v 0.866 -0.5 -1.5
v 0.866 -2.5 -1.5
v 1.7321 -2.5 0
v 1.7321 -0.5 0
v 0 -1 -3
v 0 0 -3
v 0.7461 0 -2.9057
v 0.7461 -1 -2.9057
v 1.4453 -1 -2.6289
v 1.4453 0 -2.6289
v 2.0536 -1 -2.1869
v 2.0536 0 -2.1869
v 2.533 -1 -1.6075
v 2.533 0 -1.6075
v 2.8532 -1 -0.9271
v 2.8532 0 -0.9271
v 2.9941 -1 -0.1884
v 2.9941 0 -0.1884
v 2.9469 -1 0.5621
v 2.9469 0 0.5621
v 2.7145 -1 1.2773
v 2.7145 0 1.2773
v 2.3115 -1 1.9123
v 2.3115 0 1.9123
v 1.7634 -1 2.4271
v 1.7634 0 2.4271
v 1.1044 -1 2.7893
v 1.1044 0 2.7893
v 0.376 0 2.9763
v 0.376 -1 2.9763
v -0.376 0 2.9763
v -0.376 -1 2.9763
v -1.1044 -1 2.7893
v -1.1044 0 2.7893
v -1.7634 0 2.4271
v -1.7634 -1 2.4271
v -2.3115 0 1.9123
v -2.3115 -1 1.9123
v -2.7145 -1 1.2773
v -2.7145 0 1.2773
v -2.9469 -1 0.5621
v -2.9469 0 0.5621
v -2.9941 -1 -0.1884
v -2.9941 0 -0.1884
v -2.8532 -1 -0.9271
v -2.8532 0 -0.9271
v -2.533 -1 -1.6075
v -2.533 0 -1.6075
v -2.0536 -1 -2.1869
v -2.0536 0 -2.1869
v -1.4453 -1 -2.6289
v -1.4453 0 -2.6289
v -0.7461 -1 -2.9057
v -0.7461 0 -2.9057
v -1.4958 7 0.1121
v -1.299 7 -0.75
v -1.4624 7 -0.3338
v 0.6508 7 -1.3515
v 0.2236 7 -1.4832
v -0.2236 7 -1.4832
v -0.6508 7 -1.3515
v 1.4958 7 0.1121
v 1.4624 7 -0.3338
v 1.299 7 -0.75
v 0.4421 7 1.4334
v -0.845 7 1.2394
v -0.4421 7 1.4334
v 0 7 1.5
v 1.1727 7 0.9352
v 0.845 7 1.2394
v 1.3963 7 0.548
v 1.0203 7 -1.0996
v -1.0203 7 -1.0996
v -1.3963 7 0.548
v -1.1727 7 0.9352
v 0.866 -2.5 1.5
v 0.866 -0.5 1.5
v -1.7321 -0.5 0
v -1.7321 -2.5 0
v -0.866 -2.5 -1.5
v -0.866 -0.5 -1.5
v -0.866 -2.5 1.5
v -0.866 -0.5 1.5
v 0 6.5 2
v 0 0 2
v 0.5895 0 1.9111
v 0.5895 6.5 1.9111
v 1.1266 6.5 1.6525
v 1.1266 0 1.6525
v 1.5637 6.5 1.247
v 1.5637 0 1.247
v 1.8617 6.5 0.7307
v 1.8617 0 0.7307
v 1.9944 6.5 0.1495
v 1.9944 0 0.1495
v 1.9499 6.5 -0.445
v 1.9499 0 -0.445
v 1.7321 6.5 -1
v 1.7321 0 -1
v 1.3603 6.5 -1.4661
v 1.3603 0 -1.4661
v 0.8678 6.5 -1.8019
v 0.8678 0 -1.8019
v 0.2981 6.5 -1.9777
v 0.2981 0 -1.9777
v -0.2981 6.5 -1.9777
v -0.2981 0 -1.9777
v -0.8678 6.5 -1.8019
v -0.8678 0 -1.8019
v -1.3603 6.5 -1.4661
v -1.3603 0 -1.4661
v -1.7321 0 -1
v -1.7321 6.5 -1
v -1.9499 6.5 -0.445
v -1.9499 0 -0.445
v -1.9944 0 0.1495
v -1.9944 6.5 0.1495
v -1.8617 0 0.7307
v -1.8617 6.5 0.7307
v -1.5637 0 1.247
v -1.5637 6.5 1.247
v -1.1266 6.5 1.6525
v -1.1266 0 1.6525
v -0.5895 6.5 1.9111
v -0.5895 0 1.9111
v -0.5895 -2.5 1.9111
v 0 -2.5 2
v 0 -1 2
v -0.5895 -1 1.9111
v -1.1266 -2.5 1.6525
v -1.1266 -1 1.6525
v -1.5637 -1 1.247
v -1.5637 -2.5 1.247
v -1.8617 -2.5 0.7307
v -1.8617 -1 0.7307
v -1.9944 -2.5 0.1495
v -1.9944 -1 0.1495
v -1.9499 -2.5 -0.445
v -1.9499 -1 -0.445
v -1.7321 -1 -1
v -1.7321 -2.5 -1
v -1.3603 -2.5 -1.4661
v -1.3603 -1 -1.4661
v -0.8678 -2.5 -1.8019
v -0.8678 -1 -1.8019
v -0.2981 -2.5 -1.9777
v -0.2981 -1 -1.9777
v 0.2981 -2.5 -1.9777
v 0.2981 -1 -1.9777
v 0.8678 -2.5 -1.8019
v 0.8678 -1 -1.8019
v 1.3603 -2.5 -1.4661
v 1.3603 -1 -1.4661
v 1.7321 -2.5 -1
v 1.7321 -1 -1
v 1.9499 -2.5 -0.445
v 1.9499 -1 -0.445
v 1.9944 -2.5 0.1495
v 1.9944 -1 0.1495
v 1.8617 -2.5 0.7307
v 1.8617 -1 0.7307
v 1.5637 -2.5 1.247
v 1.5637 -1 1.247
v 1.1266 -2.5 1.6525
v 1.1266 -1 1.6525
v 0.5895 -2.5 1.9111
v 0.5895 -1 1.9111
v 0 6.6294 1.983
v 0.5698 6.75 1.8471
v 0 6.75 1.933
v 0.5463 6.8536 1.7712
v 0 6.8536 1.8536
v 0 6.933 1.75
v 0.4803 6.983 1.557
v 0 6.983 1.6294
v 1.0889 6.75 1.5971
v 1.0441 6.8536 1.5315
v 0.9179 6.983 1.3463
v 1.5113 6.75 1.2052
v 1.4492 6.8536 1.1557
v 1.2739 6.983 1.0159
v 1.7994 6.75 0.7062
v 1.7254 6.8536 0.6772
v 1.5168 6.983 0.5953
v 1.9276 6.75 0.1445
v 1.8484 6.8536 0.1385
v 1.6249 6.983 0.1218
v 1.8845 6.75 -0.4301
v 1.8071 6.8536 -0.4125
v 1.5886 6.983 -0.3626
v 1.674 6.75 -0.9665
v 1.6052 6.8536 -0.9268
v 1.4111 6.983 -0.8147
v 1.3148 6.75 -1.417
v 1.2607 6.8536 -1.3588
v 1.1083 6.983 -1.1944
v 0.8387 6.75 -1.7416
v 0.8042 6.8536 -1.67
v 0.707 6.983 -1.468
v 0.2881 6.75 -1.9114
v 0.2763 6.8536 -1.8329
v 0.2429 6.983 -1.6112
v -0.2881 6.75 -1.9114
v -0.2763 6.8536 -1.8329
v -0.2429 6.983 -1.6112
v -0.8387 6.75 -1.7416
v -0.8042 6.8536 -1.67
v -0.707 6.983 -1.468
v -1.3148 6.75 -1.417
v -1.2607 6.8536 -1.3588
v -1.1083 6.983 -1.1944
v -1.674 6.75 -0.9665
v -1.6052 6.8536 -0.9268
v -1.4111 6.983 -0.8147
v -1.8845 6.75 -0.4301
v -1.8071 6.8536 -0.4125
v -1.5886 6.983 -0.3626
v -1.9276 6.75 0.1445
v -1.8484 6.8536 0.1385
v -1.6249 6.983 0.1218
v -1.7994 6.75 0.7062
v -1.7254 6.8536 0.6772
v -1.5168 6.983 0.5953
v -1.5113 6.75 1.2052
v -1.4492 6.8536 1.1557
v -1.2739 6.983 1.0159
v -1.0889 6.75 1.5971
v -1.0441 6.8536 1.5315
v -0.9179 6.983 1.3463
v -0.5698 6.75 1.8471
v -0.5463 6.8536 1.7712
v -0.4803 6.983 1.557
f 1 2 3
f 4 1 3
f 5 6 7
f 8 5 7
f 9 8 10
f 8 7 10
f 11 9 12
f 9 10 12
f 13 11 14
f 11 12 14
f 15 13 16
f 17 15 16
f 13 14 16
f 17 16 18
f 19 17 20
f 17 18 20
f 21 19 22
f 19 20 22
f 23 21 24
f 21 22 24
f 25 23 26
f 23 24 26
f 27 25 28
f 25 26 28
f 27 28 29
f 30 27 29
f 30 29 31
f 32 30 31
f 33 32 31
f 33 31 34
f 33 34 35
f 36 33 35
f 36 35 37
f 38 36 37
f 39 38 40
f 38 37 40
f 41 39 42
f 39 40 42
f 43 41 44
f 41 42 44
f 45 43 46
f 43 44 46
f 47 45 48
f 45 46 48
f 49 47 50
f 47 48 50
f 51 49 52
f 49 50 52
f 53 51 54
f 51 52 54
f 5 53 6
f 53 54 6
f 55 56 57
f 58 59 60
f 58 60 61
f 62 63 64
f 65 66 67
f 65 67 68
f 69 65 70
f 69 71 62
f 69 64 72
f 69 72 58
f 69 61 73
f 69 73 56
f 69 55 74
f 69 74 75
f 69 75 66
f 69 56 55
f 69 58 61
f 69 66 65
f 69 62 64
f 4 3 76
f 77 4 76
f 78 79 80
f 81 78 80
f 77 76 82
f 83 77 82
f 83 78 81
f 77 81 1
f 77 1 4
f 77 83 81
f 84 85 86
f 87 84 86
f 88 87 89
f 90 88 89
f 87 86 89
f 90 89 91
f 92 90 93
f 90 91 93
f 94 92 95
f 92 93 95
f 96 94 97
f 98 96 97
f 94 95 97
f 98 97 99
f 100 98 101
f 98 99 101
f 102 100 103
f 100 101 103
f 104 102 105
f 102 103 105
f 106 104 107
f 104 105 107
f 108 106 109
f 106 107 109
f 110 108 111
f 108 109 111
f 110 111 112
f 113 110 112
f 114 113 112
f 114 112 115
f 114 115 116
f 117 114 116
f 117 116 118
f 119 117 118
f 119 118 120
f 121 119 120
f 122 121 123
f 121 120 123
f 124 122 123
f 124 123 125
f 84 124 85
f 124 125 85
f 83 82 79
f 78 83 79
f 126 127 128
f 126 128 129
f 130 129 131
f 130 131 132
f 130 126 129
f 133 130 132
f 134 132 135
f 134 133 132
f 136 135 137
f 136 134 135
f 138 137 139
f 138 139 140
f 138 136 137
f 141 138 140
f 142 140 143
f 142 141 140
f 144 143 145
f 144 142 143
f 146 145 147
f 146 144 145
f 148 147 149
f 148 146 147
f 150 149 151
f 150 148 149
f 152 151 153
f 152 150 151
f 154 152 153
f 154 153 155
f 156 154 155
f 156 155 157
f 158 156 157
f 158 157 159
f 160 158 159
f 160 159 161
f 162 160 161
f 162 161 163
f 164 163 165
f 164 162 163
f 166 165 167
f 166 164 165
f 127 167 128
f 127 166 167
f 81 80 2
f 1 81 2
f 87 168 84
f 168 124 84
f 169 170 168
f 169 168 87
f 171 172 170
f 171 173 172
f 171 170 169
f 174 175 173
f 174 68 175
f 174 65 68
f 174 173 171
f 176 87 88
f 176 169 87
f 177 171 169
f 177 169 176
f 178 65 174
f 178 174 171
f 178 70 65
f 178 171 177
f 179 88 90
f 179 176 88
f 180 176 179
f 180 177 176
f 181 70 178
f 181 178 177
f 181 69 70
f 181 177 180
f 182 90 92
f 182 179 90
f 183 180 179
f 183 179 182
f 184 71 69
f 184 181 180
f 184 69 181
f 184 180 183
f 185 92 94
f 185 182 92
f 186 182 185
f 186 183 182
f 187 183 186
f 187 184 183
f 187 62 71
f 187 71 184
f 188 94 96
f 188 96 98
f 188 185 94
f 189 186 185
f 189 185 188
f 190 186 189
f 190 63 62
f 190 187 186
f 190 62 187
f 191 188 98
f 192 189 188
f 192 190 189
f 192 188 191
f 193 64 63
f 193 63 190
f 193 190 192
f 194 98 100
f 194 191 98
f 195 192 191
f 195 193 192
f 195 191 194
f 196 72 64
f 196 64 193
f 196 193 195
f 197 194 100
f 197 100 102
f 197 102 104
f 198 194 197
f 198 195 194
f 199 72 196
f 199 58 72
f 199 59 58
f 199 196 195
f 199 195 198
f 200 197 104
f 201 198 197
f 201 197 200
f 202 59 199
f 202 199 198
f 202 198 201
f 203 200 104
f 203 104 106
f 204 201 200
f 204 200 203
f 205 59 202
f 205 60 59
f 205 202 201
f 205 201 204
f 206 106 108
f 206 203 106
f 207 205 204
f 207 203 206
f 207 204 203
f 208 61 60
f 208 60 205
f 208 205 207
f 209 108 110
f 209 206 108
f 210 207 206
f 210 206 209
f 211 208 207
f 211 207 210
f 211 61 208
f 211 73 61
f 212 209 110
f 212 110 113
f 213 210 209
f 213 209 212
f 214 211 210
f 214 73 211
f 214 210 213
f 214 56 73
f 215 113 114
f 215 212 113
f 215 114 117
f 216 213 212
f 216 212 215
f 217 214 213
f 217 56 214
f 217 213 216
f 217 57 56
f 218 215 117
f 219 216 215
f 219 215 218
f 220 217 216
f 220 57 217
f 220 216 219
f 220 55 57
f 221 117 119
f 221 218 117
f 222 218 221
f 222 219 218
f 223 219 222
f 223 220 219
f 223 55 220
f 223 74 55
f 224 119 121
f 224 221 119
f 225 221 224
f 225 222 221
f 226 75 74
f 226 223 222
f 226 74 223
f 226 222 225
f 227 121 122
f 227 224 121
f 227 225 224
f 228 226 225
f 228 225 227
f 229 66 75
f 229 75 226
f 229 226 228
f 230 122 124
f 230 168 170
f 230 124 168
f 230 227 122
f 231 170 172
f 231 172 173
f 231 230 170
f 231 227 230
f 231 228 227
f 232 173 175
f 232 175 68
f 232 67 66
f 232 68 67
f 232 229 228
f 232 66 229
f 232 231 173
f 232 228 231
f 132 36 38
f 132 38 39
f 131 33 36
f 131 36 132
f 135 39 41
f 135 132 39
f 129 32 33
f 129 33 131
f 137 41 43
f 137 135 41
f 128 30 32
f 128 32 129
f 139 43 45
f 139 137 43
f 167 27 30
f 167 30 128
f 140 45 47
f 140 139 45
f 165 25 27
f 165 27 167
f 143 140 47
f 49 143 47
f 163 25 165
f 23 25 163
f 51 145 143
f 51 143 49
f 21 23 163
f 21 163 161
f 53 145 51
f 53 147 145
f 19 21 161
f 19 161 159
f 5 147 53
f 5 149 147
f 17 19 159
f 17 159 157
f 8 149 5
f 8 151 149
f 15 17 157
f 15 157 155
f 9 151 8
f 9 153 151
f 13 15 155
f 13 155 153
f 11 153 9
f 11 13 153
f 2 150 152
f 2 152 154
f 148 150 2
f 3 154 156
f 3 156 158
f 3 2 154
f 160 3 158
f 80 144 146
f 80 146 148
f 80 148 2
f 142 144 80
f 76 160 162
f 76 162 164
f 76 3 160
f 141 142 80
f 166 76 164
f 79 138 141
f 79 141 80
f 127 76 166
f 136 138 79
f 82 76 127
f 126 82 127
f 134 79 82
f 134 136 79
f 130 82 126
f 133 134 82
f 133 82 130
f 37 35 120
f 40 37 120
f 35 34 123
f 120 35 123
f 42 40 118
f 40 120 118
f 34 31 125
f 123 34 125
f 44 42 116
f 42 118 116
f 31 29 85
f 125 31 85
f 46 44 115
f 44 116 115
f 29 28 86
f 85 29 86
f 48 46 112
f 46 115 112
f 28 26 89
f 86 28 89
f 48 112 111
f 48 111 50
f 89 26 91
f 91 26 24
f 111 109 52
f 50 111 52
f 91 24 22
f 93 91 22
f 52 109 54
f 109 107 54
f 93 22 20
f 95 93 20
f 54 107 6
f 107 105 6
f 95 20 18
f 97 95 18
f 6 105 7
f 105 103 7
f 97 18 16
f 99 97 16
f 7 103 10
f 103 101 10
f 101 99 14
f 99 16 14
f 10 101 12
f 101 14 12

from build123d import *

# Parameters (mm, degrees)
SKETCH_1_R          = 2
EXTRUDE_1_DEPTH     = 7
FILLET_2_R          = 0.5
SKETCH_4_R          = 3
EXTRUDE_2_DEPTH     = 1
EXTRUDE_START       = 1.5
SKETCH_5_R          = 2
EXTRUDE_3_DEPTH     = 1.5
CUT_EXTRUDE_1_DEPTH = 2


with BuildPart() as part:
    # 草图1 → 凸台-拉伸1 (new body)
    with BuildSketch(Plane(origin=(0, 0, 0), x_dir=(1, 0, 0), z_dir=(0, 1, 0))):
        with Locations(Location((0, 0, 0), (0, 0, 270))):
            Circle(SKETCH_1_R)
    extrude(amount=EXTRUDE_1_DEPTH)

    # 圆角2
    fillet_2_edges = [part.edges().sort_by_distance(p)[0] for p in [
        (0, 7, -2),
    ]]
    fillet(fillet_2_edges, radius=FILLET_2_R)

    # 草图4 → 凸台-拉伸2 (add)
    with BuildSketch(Plane.XZ):
        with Locations(Location((0, 0, 0), (0, 0, 270))):
            Circle(SKETCH_4_R)
    extrude(amount=EXTRUDE_2_DEPTH)

    # 草图5 → 凸台-拉伸3 (add)
    with BuildSketch(Plane.XZ.offset(1).offset(EXTRUDE_START)):
        with Locations(Location((0, 0, 0), (0, 0, 90))):
            Circle(SKETCH_5_R)
    extrude(amount=-EXTRUDE_3_DEPTH)

    # 草图6 → 切除-拉伸1 (cut)
    with BuildSketch(Plane.XZ.offset(2.5)):
        Polygon((1.732050808, 0), (0.866025404, 1.5), (-0.866025404, 1.5), (-1.732050808, 0), (-0.866025404, -1.5), (0.866025404, -1.5), align=None)
    extrude(amount=-CUT_EXTRUDE_1_DEPTH, mode=Mode.SUBTRACT)


solid = part.part
